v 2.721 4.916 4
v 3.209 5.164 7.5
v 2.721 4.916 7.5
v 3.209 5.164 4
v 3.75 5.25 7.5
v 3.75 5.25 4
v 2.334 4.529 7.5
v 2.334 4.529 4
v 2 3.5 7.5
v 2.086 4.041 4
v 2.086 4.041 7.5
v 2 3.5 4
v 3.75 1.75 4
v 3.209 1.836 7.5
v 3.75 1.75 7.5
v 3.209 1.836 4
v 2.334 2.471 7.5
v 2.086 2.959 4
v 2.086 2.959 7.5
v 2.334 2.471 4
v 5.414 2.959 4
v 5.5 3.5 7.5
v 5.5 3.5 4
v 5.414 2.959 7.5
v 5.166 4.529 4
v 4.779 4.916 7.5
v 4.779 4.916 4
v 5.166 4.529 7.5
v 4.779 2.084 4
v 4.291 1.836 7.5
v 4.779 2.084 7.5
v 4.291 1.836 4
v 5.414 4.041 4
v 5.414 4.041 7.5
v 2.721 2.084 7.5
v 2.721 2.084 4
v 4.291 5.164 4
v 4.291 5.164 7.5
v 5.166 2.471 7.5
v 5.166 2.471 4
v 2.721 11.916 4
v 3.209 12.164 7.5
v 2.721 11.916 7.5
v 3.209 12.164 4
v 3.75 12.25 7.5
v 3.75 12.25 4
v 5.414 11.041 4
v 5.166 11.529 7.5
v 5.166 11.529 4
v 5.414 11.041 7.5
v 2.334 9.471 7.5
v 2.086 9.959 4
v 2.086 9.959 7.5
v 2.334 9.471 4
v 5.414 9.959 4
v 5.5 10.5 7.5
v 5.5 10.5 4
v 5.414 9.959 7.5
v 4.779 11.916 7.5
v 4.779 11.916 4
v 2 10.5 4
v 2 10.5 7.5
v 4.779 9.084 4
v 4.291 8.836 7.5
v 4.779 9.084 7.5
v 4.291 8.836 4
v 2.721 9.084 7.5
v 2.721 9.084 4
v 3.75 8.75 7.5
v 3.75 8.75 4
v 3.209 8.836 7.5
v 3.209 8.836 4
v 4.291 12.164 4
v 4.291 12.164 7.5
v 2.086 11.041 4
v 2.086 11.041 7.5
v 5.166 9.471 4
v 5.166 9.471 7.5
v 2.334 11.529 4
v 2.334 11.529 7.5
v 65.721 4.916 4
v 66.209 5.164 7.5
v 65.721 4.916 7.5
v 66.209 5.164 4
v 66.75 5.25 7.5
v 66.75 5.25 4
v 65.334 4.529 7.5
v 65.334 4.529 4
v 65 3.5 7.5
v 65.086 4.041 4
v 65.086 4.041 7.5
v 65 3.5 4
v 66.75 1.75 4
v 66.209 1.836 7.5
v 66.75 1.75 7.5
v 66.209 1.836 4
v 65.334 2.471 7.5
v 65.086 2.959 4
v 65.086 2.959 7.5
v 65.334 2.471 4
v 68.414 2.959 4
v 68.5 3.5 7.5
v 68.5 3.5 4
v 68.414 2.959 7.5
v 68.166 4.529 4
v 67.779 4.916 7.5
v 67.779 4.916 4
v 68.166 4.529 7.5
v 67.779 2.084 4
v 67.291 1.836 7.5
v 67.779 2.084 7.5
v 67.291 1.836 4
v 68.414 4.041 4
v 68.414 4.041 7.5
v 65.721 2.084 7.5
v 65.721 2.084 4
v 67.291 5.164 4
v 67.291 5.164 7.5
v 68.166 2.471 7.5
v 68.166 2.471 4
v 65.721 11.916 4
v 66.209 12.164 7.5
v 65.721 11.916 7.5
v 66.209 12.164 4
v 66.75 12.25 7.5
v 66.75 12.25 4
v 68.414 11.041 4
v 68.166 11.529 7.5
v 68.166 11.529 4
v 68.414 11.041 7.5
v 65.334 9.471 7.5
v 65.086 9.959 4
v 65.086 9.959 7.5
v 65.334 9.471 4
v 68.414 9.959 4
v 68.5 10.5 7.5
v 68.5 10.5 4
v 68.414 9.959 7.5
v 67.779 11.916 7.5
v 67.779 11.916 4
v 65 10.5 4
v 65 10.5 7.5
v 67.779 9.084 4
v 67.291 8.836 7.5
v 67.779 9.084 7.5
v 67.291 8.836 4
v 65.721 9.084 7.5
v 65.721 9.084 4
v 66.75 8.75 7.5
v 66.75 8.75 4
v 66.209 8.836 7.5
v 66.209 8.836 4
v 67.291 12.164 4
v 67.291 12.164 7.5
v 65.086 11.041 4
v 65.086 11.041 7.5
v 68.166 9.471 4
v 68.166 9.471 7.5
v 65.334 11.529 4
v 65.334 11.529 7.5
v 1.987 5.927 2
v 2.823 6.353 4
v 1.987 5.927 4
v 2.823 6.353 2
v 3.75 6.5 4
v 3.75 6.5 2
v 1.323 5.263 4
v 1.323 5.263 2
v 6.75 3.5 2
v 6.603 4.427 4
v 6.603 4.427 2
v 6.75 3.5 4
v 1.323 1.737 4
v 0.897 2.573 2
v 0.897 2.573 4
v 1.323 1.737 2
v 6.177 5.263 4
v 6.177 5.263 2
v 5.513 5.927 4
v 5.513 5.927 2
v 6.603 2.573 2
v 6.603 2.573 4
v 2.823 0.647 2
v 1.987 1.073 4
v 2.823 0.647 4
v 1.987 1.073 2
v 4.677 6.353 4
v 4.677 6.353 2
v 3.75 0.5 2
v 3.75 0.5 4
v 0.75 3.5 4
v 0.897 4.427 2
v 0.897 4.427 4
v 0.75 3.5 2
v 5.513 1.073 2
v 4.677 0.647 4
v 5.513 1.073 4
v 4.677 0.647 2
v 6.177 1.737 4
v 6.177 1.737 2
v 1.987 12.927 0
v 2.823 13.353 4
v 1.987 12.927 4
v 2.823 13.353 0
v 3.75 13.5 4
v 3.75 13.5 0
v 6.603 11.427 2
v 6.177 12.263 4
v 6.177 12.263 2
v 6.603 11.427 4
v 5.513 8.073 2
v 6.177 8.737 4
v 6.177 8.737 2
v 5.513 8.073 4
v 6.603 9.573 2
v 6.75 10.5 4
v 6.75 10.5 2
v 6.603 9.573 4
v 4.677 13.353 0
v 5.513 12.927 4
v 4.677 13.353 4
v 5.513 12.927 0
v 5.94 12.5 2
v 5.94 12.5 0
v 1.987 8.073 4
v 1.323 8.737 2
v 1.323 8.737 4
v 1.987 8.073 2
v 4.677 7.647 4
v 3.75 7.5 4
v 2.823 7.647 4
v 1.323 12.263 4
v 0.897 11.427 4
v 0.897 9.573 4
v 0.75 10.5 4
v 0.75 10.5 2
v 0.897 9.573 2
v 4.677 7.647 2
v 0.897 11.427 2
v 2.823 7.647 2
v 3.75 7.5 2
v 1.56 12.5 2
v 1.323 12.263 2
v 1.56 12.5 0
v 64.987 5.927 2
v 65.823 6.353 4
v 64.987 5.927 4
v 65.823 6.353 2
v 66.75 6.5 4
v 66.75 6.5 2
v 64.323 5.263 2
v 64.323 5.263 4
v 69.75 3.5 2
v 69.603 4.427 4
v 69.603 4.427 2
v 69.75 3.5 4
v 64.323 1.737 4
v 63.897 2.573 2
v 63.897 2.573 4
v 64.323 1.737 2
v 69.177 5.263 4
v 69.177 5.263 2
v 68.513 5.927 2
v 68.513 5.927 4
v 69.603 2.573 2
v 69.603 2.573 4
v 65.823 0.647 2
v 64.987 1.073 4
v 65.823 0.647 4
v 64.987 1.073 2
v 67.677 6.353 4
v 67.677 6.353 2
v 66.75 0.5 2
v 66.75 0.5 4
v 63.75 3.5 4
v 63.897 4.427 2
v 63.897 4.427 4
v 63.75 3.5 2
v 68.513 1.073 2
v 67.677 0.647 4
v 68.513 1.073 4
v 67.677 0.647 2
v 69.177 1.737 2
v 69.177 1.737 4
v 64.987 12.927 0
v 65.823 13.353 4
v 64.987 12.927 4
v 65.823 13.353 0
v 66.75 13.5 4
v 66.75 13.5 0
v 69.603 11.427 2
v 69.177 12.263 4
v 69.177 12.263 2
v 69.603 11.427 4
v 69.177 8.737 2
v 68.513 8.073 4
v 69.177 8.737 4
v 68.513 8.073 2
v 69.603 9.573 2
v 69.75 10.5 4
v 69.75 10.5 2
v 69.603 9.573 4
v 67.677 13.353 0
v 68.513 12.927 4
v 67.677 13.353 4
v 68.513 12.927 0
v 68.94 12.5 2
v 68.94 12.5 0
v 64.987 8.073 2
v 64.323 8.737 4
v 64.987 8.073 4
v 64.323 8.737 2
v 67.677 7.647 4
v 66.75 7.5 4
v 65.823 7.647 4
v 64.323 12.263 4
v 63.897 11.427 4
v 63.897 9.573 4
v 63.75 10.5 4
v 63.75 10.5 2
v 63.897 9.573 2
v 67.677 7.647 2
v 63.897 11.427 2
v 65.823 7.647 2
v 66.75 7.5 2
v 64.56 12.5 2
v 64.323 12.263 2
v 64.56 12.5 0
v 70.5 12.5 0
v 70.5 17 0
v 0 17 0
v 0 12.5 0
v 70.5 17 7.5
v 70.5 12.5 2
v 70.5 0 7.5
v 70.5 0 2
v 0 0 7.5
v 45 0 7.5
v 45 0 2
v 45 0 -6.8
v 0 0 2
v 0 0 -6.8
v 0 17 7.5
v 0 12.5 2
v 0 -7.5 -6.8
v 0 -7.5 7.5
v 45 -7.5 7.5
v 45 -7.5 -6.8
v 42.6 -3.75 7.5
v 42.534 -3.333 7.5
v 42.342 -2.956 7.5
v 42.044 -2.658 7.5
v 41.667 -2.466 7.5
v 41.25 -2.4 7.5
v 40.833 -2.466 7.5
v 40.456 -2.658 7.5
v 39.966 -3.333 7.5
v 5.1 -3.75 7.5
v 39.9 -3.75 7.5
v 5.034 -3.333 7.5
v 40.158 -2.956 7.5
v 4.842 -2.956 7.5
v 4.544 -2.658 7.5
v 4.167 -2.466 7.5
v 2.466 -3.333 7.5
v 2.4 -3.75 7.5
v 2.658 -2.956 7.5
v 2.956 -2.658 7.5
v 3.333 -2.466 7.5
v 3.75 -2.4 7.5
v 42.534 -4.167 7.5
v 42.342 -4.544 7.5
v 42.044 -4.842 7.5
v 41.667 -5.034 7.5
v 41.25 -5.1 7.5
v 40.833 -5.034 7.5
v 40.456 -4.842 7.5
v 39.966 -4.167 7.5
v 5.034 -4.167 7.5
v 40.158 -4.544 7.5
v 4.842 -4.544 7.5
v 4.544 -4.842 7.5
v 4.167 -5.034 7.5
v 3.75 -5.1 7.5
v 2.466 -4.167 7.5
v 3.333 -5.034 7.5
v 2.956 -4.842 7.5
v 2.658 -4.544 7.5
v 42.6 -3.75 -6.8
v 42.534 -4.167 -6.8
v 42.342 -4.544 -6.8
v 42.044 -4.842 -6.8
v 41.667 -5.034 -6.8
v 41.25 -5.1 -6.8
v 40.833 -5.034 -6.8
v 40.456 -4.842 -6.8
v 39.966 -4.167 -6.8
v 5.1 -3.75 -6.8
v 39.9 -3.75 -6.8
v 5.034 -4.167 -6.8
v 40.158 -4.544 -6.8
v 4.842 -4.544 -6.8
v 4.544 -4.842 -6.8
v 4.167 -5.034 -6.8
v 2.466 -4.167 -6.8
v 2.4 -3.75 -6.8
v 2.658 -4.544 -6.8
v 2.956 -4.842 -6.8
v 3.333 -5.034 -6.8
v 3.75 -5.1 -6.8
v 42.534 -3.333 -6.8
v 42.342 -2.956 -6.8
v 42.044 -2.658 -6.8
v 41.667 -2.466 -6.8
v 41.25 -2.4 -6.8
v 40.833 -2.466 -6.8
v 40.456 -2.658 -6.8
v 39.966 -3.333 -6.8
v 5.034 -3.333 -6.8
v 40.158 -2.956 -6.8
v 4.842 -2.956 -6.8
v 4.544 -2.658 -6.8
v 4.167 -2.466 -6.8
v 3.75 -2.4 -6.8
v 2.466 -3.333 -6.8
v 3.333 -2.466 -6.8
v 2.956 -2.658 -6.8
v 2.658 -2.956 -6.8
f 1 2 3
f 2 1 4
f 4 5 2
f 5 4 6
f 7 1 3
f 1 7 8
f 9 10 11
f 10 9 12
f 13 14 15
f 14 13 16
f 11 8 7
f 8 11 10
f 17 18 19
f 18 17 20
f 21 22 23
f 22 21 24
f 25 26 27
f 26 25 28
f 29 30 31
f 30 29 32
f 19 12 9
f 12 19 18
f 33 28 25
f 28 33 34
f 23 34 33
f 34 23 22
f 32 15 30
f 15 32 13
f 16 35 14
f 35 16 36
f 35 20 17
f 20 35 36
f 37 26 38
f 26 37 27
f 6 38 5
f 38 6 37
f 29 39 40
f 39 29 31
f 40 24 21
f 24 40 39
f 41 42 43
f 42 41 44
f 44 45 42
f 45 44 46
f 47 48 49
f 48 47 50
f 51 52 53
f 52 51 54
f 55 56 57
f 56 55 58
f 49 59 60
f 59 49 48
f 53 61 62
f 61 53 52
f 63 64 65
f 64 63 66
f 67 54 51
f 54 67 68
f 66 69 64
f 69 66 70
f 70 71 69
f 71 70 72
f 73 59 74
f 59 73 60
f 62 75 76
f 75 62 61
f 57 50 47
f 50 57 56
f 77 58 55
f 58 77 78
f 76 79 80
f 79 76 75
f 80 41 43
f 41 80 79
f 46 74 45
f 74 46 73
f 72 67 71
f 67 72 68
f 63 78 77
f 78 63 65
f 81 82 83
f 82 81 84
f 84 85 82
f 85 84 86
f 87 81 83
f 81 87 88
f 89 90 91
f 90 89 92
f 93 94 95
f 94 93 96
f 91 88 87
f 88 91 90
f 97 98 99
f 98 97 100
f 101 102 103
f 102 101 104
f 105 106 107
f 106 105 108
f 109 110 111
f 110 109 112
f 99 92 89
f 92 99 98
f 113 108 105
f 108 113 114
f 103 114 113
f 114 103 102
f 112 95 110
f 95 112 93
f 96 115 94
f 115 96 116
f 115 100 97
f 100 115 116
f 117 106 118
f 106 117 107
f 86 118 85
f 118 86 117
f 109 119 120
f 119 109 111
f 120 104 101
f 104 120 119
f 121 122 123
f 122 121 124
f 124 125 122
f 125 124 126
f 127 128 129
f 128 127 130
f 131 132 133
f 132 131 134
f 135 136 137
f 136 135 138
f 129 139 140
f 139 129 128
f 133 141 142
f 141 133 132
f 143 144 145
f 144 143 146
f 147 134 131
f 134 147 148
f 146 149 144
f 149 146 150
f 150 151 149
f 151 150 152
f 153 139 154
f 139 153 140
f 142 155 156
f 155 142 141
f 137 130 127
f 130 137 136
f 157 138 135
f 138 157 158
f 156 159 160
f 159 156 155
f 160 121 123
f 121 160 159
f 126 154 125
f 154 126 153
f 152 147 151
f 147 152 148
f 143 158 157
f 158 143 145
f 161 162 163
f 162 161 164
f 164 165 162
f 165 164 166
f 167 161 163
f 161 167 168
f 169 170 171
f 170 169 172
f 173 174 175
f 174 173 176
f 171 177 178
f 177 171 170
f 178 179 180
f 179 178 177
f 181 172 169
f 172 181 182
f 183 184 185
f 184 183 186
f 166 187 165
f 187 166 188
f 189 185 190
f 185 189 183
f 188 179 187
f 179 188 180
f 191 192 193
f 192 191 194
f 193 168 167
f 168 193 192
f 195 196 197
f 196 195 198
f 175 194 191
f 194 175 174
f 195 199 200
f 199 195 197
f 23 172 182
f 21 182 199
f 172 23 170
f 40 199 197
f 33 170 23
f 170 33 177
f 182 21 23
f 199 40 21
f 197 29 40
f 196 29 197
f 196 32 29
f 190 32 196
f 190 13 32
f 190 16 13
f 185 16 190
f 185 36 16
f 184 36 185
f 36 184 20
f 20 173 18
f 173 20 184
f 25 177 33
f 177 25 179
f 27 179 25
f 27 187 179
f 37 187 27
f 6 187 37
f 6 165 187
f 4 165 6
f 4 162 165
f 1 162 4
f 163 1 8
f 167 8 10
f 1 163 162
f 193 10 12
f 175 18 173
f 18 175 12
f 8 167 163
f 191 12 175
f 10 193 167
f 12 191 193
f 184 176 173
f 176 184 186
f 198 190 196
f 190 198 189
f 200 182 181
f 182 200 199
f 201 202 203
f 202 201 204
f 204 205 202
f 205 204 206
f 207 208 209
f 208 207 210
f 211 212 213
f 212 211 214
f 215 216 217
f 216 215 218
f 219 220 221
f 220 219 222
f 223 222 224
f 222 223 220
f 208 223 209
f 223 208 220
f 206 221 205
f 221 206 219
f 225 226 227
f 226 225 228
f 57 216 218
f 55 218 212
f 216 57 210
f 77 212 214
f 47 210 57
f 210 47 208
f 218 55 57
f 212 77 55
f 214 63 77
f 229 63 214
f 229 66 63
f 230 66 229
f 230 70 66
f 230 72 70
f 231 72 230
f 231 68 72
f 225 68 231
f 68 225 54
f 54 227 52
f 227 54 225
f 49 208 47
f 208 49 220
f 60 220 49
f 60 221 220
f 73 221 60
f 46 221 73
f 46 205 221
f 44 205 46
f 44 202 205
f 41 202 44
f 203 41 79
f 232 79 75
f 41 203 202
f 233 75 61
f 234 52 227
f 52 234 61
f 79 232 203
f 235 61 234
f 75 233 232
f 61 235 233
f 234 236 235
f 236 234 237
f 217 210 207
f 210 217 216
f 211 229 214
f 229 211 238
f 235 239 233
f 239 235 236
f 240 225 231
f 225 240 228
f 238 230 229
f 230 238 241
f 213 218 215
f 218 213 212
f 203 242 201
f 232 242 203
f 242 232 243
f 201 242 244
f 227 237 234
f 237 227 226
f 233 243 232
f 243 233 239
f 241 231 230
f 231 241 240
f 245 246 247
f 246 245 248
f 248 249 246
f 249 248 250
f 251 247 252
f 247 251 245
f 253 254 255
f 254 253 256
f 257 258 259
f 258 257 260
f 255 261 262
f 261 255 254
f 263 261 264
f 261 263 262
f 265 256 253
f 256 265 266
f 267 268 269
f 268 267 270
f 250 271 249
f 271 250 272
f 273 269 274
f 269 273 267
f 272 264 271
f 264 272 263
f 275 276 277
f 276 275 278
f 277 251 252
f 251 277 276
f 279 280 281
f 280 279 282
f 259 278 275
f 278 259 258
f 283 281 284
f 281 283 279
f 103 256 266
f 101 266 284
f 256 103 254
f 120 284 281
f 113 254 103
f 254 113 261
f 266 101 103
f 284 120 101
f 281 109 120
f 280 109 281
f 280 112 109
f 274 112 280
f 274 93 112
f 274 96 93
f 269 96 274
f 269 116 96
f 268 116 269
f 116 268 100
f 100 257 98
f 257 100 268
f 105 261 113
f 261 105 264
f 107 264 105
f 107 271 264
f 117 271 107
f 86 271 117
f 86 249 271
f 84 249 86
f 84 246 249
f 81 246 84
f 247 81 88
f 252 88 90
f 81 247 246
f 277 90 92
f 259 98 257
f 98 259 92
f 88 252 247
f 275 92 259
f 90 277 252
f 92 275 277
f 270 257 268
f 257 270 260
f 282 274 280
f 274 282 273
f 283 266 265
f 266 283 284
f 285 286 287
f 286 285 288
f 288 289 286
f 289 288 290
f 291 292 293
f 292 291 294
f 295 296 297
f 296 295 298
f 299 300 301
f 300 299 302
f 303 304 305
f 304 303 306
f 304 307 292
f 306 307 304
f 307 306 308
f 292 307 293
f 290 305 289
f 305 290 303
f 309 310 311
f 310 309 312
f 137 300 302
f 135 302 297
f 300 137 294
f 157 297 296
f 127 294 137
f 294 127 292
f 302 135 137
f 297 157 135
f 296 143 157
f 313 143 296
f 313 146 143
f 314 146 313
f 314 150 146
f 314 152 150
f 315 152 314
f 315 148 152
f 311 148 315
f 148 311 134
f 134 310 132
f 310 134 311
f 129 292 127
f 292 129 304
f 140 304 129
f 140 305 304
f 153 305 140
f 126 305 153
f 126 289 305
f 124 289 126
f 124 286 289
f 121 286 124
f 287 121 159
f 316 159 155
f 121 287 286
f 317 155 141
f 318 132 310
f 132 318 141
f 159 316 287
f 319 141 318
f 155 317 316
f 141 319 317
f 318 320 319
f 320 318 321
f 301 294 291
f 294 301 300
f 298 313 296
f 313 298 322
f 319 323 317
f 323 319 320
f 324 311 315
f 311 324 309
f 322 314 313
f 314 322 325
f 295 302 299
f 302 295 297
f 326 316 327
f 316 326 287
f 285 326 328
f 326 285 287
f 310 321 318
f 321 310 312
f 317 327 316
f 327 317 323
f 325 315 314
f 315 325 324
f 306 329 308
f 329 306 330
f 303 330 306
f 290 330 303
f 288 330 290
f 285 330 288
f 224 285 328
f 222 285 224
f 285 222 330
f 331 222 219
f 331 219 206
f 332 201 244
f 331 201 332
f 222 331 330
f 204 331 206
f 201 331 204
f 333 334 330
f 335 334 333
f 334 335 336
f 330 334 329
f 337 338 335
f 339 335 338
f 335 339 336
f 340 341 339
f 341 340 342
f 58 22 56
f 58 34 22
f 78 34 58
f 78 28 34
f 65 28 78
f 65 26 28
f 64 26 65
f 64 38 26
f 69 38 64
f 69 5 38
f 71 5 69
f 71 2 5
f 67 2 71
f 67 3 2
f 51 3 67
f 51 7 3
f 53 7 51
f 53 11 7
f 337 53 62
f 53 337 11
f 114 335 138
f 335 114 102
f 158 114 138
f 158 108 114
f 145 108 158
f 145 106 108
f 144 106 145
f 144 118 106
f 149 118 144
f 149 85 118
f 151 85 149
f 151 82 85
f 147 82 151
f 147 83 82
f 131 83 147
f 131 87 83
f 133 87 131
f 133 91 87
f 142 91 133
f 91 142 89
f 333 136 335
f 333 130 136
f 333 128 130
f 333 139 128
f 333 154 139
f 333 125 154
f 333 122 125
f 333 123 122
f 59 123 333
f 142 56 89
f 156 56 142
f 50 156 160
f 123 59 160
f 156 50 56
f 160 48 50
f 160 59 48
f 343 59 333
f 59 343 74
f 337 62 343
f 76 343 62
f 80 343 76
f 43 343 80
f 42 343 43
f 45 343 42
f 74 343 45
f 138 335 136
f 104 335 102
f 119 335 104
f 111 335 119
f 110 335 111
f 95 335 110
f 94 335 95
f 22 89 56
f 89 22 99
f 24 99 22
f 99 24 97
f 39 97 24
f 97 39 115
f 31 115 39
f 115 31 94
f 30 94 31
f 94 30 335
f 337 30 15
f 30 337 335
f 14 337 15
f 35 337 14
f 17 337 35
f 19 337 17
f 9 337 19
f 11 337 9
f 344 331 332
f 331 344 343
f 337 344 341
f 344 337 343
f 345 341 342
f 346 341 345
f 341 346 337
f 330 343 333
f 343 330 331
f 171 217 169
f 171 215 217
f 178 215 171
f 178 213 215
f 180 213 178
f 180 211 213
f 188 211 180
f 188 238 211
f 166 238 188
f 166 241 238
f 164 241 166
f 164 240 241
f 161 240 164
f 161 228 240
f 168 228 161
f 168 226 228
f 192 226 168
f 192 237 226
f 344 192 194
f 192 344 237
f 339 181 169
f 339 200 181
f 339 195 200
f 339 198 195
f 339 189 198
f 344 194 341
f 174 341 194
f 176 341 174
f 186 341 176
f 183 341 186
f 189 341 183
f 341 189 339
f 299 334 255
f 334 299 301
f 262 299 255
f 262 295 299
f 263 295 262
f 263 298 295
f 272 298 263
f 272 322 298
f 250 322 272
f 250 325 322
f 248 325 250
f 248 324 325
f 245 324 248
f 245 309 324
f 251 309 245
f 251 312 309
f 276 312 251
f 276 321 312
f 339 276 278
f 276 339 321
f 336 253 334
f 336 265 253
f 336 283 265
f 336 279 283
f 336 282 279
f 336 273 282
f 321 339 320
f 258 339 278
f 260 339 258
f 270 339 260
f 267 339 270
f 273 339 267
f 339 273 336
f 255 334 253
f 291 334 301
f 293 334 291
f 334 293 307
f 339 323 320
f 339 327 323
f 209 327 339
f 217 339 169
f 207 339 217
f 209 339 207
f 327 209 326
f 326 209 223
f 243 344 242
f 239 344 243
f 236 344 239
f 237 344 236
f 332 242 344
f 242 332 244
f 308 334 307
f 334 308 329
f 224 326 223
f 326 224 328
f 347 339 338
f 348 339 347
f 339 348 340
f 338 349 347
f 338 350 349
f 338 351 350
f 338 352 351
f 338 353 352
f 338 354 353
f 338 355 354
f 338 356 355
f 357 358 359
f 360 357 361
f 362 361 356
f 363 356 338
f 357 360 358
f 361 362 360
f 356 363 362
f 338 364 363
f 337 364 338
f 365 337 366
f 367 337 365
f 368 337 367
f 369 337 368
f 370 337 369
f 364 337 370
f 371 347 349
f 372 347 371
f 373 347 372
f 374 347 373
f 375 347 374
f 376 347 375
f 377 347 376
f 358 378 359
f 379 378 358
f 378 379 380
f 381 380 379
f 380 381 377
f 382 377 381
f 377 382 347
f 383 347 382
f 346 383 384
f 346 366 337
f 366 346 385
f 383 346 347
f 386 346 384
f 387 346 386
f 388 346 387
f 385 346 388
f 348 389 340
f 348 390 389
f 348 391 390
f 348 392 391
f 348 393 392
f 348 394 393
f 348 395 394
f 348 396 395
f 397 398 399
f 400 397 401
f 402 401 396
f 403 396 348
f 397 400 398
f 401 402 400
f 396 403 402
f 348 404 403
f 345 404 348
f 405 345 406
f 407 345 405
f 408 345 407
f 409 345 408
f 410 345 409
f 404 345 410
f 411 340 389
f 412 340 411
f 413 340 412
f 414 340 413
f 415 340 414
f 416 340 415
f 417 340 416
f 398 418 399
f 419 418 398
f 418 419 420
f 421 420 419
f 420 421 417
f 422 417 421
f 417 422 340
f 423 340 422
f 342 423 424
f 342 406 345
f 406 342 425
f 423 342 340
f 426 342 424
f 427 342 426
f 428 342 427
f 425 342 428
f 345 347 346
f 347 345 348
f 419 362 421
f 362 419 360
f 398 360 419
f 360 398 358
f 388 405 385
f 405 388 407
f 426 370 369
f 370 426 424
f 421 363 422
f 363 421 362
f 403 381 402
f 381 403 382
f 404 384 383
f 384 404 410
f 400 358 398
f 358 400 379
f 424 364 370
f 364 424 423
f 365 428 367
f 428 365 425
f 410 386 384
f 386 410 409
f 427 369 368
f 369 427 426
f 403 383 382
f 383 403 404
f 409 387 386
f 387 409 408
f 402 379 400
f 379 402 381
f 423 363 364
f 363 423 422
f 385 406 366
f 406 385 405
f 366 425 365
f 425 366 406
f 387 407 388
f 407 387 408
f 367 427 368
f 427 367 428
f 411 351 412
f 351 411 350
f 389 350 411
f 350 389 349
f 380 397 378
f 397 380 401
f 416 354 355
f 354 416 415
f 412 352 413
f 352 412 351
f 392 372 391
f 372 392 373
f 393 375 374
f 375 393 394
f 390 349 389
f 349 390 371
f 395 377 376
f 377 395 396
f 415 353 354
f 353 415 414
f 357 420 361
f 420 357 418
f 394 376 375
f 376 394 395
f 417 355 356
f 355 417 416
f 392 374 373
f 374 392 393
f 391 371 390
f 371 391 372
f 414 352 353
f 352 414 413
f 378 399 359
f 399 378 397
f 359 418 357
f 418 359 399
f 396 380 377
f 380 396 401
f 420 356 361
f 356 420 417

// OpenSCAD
function rel_to_abs(list, i = 0, sum = [0,0], result = []) = 
    i == len(list) ? result : rel_to_abs(list, i + 1, sum + list[i], concat(result, [sum + list[i]]));
    

module doubleHoles() {
cylinder(h = 20, r = 1.75, $fn=20);
translate([7,0,0]) cylinder(h = 20, r = 1.75, $fn=20);
}

module doubleHoles6mm() {
cylinder(h = 5, r = 3, $fn=20);
translate([7,0,0]) cylinder(h = 5, r = 3, $fn=20);
}

difference() {
  linear_extrude(7.5) polygon(rel_to_abs([[0,0],[70.5,0],[0,17],[-70.5,0]]));

  rotate([0,0,90]) translate([3.5, -3.75, -1]) doubleHoles();
  rotate([0,0,90]) translate([3.5, -66.75, -1]) doubleHoles();
    
  rotate([0,0,90]) translate([3.5, -3.75, -1]) doubleHoles6mm();
  rotate([0,0,90]) translate([3.5, -66.75, -1]) doubleHoles6mm();
    
  linear_extrude(2) polygon(rel_to_abs([[0,0],[70.5,0],[0,12.5],[-70.5,0]]));

}

//#translate([50.5,-20,2]) limit_switch_protrusion();
translate([0,-7.5,-6.8]) back();

module limit_switch_protrusion() {
    difference() {
        cube(size = [20,20,5.5]);
        translate([3.5,5.5,0]) cylinder(h = 20, r = 2.1/2, $fn=20);
        translate([3.5,15,0]) cylinder(h = 20, r = 2.1/2, $fn=20);

    }
}

module back() {
    difference() {
        cube(size = [45,7.5,14.3]);
        translate([3.75,3.75,0]) cylinder(h = 20, r = 2.7/2, $fn=20);
        translate([41.25,3.75,0]) cylinder(h = 20, r = 2.7/2, $fn=20);

    }
}
